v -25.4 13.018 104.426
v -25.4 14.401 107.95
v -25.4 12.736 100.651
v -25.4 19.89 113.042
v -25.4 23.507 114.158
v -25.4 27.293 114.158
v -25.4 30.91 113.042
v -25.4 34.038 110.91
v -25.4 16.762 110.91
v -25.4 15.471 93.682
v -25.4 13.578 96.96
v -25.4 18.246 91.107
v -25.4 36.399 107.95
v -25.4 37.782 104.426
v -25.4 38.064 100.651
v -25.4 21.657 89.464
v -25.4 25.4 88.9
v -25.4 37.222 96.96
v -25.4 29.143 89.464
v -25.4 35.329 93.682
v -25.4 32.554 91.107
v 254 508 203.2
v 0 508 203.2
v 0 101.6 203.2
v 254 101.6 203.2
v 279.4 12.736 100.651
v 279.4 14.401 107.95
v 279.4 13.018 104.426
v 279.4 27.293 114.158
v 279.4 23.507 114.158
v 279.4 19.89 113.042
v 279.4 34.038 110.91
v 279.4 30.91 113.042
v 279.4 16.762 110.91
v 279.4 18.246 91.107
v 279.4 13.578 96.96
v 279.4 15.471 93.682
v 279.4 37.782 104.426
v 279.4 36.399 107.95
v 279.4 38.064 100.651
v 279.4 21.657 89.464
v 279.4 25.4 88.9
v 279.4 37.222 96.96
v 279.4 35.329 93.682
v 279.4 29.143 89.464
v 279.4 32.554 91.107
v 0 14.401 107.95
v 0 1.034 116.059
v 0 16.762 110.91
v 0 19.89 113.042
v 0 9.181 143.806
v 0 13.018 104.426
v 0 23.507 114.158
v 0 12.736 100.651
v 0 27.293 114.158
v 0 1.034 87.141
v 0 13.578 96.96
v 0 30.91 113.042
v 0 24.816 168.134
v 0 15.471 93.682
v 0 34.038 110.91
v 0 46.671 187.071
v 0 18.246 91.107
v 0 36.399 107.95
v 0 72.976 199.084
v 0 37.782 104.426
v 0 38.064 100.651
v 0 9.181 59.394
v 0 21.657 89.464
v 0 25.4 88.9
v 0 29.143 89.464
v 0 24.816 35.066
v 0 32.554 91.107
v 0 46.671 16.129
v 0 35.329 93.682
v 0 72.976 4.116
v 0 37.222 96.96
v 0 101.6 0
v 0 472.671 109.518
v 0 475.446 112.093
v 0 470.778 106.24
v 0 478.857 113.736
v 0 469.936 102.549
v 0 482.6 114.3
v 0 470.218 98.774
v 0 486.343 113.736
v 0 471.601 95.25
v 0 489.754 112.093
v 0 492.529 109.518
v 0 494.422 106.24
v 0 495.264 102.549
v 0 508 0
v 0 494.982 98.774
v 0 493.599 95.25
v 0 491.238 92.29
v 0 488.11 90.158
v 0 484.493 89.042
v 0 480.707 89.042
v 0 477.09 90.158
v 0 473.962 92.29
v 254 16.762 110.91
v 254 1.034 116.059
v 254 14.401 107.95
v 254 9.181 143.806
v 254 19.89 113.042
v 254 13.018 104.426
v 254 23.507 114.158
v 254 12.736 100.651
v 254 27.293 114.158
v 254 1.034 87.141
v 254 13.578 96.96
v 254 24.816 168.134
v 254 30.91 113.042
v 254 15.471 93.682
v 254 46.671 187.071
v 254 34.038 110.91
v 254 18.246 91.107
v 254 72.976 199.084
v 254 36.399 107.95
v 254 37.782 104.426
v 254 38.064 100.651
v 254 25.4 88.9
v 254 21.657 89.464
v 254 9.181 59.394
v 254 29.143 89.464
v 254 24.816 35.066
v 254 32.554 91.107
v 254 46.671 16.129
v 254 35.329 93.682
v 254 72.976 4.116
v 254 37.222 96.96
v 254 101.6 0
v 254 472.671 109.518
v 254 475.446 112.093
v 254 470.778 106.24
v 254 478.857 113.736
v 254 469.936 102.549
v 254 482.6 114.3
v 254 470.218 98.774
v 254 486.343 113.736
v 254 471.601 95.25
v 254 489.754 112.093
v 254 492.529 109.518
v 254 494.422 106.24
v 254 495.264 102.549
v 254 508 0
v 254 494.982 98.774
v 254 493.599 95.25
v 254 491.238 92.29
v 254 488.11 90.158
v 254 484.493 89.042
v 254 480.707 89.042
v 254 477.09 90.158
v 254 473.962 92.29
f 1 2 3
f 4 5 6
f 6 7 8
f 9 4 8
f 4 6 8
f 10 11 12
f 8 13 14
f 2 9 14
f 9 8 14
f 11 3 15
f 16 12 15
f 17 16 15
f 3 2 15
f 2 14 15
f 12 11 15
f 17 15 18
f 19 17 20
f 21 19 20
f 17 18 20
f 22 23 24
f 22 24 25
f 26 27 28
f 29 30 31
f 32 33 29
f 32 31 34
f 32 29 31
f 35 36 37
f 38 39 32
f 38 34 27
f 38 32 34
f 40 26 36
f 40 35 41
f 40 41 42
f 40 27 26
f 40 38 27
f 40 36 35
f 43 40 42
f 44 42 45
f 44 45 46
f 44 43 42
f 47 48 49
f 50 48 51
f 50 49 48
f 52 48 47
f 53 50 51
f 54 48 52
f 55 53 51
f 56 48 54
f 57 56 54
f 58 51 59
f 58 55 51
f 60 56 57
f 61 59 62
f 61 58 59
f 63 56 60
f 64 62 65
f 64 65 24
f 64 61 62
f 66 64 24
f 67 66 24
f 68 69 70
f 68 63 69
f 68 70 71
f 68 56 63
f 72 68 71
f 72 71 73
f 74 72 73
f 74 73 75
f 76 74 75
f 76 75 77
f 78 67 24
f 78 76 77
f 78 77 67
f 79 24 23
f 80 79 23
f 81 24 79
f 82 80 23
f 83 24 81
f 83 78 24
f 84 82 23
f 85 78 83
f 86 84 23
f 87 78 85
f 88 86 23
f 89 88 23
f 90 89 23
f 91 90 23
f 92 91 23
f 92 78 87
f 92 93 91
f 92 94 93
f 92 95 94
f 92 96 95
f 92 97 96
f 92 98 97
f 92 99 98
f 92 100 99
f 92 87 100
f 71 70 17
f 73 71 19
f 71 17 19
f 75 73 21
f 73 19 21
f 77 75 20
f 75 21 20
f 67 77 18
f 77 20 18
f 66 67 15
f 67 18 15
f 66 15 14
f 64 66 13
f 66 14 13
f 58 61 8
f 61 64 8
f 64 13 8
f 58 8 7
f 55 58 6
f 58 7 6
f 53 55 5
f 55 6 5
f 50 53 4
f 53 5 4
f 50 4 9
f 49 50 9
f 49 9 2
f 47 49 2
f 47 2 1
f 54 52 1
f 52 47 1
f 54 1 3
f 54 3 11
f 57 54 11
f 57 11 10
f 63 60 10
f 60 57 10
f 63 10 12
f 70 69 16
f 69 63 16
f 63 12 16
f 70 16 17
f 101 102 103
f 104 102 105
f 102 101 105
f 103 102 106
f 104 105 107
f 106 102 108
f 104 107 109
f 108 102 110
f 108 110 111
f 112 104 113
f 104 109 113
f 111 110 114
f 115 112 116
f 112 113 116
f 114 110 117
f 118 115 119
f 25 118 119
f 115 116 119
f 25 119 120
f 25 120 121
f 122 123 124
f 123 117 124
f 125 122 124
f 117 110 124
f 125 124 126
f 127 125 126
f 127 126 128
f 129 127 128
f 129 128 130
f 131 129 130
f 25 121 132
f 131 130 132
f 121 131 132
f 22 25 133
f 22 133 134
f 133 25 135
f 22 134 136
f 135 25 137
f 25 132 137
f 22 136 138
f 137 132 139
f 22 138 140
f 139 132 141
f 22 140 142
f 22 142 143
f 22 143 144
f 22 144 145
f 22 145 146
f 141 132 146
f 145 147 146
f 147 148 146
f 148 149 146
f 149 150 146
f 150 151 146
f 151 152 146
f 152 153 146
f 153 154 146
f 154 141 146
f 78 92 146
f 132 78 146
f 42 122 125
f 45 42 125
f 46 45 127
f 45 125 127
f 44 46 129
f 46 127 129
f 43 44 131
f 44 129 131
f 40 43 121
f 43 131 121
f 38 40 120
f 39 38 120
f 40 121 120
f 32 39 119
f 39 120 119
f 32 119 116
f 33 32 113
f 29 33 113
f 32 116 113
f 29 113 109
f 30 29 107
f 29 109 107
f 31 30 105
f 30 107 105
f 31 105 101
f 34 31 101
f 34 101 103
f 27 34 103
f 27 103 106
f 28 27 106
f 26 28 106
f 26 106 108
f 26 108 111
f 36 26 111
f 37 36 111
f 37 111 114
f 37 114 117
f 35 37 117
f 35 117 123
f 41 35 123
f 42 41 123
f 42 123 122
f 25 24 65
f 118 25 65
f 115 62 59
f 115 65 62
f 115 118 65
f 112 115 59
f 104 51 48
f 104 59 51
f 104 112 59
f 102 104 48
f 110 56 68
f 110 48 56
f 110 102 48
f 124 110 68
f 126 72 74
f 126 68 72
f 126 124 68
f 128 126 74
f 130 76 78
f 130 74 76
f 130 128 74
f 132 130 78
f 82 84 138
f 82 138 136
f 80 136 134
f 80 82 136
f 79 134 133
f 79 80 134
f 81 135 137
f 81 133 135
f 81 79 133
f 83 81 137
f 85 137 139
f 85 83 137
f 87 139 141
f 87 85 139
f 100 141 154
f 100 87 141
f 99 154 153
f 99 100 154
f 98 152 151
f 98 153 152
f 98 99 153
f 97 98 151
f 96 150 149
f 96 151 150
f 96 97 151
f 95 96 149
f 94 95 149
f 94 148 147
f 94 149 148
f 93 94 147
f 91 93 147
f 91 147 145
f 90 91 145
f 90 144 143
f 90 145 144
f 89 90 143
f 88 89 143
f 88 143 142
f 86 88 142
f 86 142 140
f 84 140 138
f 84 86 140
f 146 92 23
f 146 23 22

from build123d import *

# Parameters (mm, degrees)
SKETCH1_W                = 254
SKETCH1_H                = 508
BOSS_EXTRUDE1_DEPTH      = 203.2
FILLET1_RADIUS           = 101.6
FILLET1_LENGTH           = 254
BOSS_EXTRUDE2_DEPTH      = 25.4
BOSS_EXTRUDE2_DEPTH_BACK = 279.4
SKETCH2_R                = 12.7
CUT_EXTRUDE1_DEPTH       = 195.834
CUT_EXTRUDE1_DEPTH_BACK  = 440.182
SKETCH4_R                = 12.7


with BuildPart() as part:
    # Sketch1 → Boss-Extrude1 (new body)
    with BuildSketch(Plane.XY):
        with Locations((127, 254)):
            Rectangle(SKETCH1_W, SKETCH1_H)
    extrude(amount=BOSS_EXTRUDE1_DEPTH)

    # Fillet1: full round fillet: the end face becomes a half cylinder, R = half its width
    fillet1_face = Plane((127, 0, 101.6), x_dir=(1, 0, 0), z_dir=(0, -1, 0))  # on the end face: x along it, z out of the body
    fillet1_slab = fillet1_face.offset(-FILLET1_RADIUS / 2) * Box(FILLET1_LENGTH, 2 * FILLET1_RADIUS, FILLET1_RADIUS, mode=Mode.PRIVATE)  # the body's end, R deep
    fillet1_round = Plane((127, 101.6, 101.6), x_dir=(0, -1, 0), z_dir=(1, 0, 0)) * Cylinder(FILLET1_RADIUS, FILLET1_LENGTH, mode=Mode.PRIVATE)  # its axis R under the face
    add(fillet1_slab - fillet1_round, mode=Mode.SUBTRACT)

    # Sketch2 → Boss-Extrude2 (add, two sides: drawn at the far end of the back side and taken through both)
    with BuildSketch(Plane(origin=(254, 0, 0), x_dir=(0, 0, -1), z_dir=(1, 0, 0)).offset(-BOSS_EXTRUDE2_DEPTH_BACK)):
        with Locations((-101.6, 25.4)):
            Circle(SKETCH2_R)
    extrude(amount=BOSS_EXTRUDE2_DEPTH + BOSS_EXTRUDE2_DEPTH_BACK)

    # Sketch4 → Cut-Extrude1 (cut, two sides: drawn at the far end of the back side and taken through both)
    with BuildSketch(Plane(origin=(254, 0, 0), x_dir=(0, 0, -1), z_dir=(1, 0, 0)).offset(-CUT_EXTRUDE1_DEPTH_BACK)):
        with Locations(Location((-101.6, 482.6, 0), (0, 0, 180))):
            Circle(SKETCH4_R)
    extrude(amount=CUT_EXTRUDE1_DEPTH + CUT_EXTRUDE1_DEPTH_BACK, mode=Mode.SUBTRACT)


solid = part.part
